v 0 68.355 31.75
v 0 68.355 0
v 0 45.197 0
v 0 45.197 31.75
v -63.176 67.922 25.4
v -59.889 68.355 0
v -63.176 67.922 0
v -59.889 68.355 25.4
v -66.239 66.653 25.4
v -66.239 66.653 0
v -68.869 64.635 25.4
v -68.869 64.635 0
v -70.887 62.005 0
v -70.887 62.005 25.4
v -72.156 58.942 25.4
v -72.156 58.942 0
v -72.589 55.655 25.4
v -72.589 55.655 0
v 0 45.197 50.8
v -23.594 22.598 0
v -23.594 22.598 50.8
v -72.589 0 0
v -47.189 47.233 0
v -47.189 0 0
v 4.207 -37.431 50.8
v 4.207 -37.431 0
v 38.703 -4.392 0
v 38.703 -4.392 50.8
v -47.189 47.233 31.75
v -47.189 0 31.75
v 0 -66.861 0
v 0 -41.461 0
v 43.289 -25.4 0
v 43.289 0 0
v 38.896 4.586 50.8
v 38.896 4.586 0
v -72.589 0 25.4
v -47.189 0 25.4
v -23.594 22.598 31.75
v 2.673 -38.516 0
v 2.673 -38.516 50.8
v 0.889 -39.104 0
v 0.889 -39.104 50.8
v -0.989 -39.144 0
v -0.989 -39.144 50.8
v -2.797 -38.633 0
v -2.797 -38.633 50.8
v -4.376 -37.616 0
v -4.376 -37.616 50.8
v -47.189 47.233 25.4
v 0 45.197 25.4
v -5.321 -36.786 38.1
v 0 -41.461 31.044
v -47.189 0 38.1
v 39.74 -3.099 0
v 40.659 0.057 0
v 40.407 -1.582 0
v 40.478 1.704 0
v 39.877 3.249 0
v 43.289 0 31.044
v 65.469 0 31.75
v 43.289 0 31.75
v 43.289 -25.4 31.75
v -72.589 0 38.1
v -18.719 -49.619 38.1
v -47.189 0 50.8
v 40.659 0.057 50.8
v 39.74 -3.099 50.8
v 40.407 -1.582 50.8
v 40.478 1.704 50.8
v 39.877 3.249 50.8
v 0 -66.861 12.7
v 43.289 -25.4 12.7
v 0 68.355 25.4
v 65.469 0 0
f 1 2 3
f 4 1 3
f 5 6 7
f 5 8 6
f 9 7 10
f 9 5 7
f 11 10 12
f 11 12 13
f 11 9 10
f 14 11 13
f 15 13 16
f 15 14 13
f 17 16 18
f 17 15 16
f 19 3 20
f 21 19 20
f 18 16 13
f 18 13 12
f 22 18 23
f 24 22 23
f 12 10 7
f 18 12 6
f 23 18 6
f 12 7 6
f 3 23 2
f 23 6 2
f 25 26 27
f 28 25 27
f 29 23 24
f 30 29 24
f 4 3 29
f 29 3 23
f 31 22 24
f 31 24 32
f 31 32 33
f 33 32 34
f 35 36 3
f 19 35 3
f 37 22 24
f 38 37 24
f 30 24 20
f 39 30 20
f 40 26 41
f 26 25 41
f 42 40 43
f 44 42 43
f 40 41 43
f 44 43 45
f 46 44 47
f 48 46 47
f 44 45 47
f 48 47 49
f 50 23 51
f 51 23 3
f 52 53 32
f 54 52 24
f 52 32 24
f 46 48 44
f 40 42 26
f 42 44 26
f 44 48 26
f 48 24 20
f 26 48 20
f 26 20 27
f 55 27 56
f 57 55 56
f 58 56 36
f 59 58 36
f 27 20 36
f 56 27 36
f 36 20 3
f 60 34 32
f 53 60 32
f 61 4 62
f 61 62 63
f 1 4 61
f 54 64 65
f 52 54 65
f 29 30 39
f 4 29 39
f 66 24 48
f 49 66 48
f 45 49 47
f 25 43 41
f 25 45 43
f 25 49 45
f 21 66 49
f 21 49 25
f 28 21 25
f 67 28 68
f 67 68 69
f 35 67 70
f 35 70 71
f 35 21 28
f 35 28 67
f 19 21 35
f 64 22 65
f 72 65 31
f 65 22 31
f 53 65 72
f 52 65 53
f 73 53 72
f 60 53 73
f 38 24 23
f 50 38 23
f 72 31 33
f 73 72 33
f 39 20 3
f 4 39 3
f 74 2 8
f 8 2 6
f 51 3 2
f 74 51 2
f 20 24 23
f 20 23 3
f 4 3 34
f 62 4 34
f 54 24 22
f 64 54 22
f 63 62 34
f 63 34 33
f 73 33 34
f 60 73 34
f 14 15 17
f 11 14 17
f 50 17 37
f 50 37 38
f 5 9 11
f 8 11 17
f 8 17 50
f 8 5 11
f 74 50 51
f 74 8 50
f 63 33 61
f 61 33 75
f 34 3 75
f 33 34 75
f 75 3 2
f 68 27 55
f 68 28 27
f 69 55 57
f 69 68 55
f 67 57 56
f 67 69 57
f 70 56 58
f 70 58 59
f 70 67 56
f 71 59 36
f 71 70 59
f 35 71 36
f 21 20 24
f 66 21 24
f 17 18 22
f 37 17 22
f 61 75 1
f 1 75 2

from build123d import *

# Parameters (mm, degrees)
F1_DEPTH = 50.8
F2_DEPTH = 38.1
F3_DEPTH = 25.4
F4_DEPTH = 31.75
F5_DEPTH = 31.75
F6_SIZE2 = 25.4
F6_SIZE  = 25.4
F7_R     = 6.35
F8_R     = 12.7
F9_R     = 6.35


with BuildPart() as f1:
    # F0 (on Top) → F1 (new body)
    with BuildSketch(Plane.XY):
        Polygon((-23.5943623059, 22.5982947493), (-47.1887246119, 0), (0, -41.4610707942), (43.2885550331, 0), (0, 45.1965894986), align=None)
    extrude(amount=F1_DEPTH)

    # F7
    f7_edges = [f1.edges().sort_by_distance(p)[0] for p in [
        (43.288555, 0, 25.4),
    ]]
    fillet(f7_edges, radius=F7_R)

    # F9
    f9_edges = [f1.edges().sort_by_distance(p)[0] for p in [
        (0, -41.461071, 25.4),
    ]]
    fillet(f9_edges, radius=F9_R)


with BuildPart() as f2:
    # F0 (on Top) → F2 (new body)
    with BuildSketch(Plane.XY):
        Polygon((43.2885550331, 0), (0, -41.4610707942), (0, -66.8610707942), (43.2885550331, -25.4), align=None)
        Polygon((0, -41.4610707942), (-47.1887246119, 0), (-72.5887246119, 0), (0, -66.8610707942), align=None)
    extrude(amount=F2_DEPTH)

    # F6
    f6_edges = [f2.edges().sort_by_distance(p)[0] for p in [
        (21.644278, -46.130535, 38.1),
    ]]
    chamfer(f6_edges, length=F6_SIZE, length2=F6_SIZE2)


with BuildPart() as f3:
    # F0 (on Top) → F3 (new body)
    with BuildSketch(Plane.XY):
        Polygon((-72.5887246119, 0), (-47.1887246119, 0), (-47.1887246119, 47.2326283926), (0, 45.1965894986), (0, 68.354524672), (-72.5887246119, 68.354524672), align=None)
    extrude(amount=F3_DEPTH)

    # F8
    f8_edges = [f3.edges().sort_by_distance(p)[0] for p in [
        (-72.588725, 68.354525, 12.7),
    ]]
    fillet(f8_edges, radius=F8_R)


with BuildPart() as f4:
    # F0 (on Top) → F4 (new body)
    with BuildSketch(Plane.XY):
        Polygon((-47.1887246119, 47.2326283926), (-23.5943623059, 22.5982947493), (0, 45.1965894986), align=None)
        Polygon((-47.1887246119, 47.2326283926), (-47.1887246119, 0), (-23.5943623059, 22.5982947493), align=None)
    extrude(amount=F4_DEPTH)


with BuildPart() as f5:
    # F0 (on Top) → F5 (new body)
    with BuildSketch(Plane.XY):
        Polygon((0, 68.354524672), (0, 45.1965894986), (43.2885550331, 0), (43.2885550331, -25.4), (65.4688470049, 0), align=None)
    extrude(amount=F5_DEPTH)


solid = Compound([f1.part, f2.part, f3.part, f4.part, f5.part])
